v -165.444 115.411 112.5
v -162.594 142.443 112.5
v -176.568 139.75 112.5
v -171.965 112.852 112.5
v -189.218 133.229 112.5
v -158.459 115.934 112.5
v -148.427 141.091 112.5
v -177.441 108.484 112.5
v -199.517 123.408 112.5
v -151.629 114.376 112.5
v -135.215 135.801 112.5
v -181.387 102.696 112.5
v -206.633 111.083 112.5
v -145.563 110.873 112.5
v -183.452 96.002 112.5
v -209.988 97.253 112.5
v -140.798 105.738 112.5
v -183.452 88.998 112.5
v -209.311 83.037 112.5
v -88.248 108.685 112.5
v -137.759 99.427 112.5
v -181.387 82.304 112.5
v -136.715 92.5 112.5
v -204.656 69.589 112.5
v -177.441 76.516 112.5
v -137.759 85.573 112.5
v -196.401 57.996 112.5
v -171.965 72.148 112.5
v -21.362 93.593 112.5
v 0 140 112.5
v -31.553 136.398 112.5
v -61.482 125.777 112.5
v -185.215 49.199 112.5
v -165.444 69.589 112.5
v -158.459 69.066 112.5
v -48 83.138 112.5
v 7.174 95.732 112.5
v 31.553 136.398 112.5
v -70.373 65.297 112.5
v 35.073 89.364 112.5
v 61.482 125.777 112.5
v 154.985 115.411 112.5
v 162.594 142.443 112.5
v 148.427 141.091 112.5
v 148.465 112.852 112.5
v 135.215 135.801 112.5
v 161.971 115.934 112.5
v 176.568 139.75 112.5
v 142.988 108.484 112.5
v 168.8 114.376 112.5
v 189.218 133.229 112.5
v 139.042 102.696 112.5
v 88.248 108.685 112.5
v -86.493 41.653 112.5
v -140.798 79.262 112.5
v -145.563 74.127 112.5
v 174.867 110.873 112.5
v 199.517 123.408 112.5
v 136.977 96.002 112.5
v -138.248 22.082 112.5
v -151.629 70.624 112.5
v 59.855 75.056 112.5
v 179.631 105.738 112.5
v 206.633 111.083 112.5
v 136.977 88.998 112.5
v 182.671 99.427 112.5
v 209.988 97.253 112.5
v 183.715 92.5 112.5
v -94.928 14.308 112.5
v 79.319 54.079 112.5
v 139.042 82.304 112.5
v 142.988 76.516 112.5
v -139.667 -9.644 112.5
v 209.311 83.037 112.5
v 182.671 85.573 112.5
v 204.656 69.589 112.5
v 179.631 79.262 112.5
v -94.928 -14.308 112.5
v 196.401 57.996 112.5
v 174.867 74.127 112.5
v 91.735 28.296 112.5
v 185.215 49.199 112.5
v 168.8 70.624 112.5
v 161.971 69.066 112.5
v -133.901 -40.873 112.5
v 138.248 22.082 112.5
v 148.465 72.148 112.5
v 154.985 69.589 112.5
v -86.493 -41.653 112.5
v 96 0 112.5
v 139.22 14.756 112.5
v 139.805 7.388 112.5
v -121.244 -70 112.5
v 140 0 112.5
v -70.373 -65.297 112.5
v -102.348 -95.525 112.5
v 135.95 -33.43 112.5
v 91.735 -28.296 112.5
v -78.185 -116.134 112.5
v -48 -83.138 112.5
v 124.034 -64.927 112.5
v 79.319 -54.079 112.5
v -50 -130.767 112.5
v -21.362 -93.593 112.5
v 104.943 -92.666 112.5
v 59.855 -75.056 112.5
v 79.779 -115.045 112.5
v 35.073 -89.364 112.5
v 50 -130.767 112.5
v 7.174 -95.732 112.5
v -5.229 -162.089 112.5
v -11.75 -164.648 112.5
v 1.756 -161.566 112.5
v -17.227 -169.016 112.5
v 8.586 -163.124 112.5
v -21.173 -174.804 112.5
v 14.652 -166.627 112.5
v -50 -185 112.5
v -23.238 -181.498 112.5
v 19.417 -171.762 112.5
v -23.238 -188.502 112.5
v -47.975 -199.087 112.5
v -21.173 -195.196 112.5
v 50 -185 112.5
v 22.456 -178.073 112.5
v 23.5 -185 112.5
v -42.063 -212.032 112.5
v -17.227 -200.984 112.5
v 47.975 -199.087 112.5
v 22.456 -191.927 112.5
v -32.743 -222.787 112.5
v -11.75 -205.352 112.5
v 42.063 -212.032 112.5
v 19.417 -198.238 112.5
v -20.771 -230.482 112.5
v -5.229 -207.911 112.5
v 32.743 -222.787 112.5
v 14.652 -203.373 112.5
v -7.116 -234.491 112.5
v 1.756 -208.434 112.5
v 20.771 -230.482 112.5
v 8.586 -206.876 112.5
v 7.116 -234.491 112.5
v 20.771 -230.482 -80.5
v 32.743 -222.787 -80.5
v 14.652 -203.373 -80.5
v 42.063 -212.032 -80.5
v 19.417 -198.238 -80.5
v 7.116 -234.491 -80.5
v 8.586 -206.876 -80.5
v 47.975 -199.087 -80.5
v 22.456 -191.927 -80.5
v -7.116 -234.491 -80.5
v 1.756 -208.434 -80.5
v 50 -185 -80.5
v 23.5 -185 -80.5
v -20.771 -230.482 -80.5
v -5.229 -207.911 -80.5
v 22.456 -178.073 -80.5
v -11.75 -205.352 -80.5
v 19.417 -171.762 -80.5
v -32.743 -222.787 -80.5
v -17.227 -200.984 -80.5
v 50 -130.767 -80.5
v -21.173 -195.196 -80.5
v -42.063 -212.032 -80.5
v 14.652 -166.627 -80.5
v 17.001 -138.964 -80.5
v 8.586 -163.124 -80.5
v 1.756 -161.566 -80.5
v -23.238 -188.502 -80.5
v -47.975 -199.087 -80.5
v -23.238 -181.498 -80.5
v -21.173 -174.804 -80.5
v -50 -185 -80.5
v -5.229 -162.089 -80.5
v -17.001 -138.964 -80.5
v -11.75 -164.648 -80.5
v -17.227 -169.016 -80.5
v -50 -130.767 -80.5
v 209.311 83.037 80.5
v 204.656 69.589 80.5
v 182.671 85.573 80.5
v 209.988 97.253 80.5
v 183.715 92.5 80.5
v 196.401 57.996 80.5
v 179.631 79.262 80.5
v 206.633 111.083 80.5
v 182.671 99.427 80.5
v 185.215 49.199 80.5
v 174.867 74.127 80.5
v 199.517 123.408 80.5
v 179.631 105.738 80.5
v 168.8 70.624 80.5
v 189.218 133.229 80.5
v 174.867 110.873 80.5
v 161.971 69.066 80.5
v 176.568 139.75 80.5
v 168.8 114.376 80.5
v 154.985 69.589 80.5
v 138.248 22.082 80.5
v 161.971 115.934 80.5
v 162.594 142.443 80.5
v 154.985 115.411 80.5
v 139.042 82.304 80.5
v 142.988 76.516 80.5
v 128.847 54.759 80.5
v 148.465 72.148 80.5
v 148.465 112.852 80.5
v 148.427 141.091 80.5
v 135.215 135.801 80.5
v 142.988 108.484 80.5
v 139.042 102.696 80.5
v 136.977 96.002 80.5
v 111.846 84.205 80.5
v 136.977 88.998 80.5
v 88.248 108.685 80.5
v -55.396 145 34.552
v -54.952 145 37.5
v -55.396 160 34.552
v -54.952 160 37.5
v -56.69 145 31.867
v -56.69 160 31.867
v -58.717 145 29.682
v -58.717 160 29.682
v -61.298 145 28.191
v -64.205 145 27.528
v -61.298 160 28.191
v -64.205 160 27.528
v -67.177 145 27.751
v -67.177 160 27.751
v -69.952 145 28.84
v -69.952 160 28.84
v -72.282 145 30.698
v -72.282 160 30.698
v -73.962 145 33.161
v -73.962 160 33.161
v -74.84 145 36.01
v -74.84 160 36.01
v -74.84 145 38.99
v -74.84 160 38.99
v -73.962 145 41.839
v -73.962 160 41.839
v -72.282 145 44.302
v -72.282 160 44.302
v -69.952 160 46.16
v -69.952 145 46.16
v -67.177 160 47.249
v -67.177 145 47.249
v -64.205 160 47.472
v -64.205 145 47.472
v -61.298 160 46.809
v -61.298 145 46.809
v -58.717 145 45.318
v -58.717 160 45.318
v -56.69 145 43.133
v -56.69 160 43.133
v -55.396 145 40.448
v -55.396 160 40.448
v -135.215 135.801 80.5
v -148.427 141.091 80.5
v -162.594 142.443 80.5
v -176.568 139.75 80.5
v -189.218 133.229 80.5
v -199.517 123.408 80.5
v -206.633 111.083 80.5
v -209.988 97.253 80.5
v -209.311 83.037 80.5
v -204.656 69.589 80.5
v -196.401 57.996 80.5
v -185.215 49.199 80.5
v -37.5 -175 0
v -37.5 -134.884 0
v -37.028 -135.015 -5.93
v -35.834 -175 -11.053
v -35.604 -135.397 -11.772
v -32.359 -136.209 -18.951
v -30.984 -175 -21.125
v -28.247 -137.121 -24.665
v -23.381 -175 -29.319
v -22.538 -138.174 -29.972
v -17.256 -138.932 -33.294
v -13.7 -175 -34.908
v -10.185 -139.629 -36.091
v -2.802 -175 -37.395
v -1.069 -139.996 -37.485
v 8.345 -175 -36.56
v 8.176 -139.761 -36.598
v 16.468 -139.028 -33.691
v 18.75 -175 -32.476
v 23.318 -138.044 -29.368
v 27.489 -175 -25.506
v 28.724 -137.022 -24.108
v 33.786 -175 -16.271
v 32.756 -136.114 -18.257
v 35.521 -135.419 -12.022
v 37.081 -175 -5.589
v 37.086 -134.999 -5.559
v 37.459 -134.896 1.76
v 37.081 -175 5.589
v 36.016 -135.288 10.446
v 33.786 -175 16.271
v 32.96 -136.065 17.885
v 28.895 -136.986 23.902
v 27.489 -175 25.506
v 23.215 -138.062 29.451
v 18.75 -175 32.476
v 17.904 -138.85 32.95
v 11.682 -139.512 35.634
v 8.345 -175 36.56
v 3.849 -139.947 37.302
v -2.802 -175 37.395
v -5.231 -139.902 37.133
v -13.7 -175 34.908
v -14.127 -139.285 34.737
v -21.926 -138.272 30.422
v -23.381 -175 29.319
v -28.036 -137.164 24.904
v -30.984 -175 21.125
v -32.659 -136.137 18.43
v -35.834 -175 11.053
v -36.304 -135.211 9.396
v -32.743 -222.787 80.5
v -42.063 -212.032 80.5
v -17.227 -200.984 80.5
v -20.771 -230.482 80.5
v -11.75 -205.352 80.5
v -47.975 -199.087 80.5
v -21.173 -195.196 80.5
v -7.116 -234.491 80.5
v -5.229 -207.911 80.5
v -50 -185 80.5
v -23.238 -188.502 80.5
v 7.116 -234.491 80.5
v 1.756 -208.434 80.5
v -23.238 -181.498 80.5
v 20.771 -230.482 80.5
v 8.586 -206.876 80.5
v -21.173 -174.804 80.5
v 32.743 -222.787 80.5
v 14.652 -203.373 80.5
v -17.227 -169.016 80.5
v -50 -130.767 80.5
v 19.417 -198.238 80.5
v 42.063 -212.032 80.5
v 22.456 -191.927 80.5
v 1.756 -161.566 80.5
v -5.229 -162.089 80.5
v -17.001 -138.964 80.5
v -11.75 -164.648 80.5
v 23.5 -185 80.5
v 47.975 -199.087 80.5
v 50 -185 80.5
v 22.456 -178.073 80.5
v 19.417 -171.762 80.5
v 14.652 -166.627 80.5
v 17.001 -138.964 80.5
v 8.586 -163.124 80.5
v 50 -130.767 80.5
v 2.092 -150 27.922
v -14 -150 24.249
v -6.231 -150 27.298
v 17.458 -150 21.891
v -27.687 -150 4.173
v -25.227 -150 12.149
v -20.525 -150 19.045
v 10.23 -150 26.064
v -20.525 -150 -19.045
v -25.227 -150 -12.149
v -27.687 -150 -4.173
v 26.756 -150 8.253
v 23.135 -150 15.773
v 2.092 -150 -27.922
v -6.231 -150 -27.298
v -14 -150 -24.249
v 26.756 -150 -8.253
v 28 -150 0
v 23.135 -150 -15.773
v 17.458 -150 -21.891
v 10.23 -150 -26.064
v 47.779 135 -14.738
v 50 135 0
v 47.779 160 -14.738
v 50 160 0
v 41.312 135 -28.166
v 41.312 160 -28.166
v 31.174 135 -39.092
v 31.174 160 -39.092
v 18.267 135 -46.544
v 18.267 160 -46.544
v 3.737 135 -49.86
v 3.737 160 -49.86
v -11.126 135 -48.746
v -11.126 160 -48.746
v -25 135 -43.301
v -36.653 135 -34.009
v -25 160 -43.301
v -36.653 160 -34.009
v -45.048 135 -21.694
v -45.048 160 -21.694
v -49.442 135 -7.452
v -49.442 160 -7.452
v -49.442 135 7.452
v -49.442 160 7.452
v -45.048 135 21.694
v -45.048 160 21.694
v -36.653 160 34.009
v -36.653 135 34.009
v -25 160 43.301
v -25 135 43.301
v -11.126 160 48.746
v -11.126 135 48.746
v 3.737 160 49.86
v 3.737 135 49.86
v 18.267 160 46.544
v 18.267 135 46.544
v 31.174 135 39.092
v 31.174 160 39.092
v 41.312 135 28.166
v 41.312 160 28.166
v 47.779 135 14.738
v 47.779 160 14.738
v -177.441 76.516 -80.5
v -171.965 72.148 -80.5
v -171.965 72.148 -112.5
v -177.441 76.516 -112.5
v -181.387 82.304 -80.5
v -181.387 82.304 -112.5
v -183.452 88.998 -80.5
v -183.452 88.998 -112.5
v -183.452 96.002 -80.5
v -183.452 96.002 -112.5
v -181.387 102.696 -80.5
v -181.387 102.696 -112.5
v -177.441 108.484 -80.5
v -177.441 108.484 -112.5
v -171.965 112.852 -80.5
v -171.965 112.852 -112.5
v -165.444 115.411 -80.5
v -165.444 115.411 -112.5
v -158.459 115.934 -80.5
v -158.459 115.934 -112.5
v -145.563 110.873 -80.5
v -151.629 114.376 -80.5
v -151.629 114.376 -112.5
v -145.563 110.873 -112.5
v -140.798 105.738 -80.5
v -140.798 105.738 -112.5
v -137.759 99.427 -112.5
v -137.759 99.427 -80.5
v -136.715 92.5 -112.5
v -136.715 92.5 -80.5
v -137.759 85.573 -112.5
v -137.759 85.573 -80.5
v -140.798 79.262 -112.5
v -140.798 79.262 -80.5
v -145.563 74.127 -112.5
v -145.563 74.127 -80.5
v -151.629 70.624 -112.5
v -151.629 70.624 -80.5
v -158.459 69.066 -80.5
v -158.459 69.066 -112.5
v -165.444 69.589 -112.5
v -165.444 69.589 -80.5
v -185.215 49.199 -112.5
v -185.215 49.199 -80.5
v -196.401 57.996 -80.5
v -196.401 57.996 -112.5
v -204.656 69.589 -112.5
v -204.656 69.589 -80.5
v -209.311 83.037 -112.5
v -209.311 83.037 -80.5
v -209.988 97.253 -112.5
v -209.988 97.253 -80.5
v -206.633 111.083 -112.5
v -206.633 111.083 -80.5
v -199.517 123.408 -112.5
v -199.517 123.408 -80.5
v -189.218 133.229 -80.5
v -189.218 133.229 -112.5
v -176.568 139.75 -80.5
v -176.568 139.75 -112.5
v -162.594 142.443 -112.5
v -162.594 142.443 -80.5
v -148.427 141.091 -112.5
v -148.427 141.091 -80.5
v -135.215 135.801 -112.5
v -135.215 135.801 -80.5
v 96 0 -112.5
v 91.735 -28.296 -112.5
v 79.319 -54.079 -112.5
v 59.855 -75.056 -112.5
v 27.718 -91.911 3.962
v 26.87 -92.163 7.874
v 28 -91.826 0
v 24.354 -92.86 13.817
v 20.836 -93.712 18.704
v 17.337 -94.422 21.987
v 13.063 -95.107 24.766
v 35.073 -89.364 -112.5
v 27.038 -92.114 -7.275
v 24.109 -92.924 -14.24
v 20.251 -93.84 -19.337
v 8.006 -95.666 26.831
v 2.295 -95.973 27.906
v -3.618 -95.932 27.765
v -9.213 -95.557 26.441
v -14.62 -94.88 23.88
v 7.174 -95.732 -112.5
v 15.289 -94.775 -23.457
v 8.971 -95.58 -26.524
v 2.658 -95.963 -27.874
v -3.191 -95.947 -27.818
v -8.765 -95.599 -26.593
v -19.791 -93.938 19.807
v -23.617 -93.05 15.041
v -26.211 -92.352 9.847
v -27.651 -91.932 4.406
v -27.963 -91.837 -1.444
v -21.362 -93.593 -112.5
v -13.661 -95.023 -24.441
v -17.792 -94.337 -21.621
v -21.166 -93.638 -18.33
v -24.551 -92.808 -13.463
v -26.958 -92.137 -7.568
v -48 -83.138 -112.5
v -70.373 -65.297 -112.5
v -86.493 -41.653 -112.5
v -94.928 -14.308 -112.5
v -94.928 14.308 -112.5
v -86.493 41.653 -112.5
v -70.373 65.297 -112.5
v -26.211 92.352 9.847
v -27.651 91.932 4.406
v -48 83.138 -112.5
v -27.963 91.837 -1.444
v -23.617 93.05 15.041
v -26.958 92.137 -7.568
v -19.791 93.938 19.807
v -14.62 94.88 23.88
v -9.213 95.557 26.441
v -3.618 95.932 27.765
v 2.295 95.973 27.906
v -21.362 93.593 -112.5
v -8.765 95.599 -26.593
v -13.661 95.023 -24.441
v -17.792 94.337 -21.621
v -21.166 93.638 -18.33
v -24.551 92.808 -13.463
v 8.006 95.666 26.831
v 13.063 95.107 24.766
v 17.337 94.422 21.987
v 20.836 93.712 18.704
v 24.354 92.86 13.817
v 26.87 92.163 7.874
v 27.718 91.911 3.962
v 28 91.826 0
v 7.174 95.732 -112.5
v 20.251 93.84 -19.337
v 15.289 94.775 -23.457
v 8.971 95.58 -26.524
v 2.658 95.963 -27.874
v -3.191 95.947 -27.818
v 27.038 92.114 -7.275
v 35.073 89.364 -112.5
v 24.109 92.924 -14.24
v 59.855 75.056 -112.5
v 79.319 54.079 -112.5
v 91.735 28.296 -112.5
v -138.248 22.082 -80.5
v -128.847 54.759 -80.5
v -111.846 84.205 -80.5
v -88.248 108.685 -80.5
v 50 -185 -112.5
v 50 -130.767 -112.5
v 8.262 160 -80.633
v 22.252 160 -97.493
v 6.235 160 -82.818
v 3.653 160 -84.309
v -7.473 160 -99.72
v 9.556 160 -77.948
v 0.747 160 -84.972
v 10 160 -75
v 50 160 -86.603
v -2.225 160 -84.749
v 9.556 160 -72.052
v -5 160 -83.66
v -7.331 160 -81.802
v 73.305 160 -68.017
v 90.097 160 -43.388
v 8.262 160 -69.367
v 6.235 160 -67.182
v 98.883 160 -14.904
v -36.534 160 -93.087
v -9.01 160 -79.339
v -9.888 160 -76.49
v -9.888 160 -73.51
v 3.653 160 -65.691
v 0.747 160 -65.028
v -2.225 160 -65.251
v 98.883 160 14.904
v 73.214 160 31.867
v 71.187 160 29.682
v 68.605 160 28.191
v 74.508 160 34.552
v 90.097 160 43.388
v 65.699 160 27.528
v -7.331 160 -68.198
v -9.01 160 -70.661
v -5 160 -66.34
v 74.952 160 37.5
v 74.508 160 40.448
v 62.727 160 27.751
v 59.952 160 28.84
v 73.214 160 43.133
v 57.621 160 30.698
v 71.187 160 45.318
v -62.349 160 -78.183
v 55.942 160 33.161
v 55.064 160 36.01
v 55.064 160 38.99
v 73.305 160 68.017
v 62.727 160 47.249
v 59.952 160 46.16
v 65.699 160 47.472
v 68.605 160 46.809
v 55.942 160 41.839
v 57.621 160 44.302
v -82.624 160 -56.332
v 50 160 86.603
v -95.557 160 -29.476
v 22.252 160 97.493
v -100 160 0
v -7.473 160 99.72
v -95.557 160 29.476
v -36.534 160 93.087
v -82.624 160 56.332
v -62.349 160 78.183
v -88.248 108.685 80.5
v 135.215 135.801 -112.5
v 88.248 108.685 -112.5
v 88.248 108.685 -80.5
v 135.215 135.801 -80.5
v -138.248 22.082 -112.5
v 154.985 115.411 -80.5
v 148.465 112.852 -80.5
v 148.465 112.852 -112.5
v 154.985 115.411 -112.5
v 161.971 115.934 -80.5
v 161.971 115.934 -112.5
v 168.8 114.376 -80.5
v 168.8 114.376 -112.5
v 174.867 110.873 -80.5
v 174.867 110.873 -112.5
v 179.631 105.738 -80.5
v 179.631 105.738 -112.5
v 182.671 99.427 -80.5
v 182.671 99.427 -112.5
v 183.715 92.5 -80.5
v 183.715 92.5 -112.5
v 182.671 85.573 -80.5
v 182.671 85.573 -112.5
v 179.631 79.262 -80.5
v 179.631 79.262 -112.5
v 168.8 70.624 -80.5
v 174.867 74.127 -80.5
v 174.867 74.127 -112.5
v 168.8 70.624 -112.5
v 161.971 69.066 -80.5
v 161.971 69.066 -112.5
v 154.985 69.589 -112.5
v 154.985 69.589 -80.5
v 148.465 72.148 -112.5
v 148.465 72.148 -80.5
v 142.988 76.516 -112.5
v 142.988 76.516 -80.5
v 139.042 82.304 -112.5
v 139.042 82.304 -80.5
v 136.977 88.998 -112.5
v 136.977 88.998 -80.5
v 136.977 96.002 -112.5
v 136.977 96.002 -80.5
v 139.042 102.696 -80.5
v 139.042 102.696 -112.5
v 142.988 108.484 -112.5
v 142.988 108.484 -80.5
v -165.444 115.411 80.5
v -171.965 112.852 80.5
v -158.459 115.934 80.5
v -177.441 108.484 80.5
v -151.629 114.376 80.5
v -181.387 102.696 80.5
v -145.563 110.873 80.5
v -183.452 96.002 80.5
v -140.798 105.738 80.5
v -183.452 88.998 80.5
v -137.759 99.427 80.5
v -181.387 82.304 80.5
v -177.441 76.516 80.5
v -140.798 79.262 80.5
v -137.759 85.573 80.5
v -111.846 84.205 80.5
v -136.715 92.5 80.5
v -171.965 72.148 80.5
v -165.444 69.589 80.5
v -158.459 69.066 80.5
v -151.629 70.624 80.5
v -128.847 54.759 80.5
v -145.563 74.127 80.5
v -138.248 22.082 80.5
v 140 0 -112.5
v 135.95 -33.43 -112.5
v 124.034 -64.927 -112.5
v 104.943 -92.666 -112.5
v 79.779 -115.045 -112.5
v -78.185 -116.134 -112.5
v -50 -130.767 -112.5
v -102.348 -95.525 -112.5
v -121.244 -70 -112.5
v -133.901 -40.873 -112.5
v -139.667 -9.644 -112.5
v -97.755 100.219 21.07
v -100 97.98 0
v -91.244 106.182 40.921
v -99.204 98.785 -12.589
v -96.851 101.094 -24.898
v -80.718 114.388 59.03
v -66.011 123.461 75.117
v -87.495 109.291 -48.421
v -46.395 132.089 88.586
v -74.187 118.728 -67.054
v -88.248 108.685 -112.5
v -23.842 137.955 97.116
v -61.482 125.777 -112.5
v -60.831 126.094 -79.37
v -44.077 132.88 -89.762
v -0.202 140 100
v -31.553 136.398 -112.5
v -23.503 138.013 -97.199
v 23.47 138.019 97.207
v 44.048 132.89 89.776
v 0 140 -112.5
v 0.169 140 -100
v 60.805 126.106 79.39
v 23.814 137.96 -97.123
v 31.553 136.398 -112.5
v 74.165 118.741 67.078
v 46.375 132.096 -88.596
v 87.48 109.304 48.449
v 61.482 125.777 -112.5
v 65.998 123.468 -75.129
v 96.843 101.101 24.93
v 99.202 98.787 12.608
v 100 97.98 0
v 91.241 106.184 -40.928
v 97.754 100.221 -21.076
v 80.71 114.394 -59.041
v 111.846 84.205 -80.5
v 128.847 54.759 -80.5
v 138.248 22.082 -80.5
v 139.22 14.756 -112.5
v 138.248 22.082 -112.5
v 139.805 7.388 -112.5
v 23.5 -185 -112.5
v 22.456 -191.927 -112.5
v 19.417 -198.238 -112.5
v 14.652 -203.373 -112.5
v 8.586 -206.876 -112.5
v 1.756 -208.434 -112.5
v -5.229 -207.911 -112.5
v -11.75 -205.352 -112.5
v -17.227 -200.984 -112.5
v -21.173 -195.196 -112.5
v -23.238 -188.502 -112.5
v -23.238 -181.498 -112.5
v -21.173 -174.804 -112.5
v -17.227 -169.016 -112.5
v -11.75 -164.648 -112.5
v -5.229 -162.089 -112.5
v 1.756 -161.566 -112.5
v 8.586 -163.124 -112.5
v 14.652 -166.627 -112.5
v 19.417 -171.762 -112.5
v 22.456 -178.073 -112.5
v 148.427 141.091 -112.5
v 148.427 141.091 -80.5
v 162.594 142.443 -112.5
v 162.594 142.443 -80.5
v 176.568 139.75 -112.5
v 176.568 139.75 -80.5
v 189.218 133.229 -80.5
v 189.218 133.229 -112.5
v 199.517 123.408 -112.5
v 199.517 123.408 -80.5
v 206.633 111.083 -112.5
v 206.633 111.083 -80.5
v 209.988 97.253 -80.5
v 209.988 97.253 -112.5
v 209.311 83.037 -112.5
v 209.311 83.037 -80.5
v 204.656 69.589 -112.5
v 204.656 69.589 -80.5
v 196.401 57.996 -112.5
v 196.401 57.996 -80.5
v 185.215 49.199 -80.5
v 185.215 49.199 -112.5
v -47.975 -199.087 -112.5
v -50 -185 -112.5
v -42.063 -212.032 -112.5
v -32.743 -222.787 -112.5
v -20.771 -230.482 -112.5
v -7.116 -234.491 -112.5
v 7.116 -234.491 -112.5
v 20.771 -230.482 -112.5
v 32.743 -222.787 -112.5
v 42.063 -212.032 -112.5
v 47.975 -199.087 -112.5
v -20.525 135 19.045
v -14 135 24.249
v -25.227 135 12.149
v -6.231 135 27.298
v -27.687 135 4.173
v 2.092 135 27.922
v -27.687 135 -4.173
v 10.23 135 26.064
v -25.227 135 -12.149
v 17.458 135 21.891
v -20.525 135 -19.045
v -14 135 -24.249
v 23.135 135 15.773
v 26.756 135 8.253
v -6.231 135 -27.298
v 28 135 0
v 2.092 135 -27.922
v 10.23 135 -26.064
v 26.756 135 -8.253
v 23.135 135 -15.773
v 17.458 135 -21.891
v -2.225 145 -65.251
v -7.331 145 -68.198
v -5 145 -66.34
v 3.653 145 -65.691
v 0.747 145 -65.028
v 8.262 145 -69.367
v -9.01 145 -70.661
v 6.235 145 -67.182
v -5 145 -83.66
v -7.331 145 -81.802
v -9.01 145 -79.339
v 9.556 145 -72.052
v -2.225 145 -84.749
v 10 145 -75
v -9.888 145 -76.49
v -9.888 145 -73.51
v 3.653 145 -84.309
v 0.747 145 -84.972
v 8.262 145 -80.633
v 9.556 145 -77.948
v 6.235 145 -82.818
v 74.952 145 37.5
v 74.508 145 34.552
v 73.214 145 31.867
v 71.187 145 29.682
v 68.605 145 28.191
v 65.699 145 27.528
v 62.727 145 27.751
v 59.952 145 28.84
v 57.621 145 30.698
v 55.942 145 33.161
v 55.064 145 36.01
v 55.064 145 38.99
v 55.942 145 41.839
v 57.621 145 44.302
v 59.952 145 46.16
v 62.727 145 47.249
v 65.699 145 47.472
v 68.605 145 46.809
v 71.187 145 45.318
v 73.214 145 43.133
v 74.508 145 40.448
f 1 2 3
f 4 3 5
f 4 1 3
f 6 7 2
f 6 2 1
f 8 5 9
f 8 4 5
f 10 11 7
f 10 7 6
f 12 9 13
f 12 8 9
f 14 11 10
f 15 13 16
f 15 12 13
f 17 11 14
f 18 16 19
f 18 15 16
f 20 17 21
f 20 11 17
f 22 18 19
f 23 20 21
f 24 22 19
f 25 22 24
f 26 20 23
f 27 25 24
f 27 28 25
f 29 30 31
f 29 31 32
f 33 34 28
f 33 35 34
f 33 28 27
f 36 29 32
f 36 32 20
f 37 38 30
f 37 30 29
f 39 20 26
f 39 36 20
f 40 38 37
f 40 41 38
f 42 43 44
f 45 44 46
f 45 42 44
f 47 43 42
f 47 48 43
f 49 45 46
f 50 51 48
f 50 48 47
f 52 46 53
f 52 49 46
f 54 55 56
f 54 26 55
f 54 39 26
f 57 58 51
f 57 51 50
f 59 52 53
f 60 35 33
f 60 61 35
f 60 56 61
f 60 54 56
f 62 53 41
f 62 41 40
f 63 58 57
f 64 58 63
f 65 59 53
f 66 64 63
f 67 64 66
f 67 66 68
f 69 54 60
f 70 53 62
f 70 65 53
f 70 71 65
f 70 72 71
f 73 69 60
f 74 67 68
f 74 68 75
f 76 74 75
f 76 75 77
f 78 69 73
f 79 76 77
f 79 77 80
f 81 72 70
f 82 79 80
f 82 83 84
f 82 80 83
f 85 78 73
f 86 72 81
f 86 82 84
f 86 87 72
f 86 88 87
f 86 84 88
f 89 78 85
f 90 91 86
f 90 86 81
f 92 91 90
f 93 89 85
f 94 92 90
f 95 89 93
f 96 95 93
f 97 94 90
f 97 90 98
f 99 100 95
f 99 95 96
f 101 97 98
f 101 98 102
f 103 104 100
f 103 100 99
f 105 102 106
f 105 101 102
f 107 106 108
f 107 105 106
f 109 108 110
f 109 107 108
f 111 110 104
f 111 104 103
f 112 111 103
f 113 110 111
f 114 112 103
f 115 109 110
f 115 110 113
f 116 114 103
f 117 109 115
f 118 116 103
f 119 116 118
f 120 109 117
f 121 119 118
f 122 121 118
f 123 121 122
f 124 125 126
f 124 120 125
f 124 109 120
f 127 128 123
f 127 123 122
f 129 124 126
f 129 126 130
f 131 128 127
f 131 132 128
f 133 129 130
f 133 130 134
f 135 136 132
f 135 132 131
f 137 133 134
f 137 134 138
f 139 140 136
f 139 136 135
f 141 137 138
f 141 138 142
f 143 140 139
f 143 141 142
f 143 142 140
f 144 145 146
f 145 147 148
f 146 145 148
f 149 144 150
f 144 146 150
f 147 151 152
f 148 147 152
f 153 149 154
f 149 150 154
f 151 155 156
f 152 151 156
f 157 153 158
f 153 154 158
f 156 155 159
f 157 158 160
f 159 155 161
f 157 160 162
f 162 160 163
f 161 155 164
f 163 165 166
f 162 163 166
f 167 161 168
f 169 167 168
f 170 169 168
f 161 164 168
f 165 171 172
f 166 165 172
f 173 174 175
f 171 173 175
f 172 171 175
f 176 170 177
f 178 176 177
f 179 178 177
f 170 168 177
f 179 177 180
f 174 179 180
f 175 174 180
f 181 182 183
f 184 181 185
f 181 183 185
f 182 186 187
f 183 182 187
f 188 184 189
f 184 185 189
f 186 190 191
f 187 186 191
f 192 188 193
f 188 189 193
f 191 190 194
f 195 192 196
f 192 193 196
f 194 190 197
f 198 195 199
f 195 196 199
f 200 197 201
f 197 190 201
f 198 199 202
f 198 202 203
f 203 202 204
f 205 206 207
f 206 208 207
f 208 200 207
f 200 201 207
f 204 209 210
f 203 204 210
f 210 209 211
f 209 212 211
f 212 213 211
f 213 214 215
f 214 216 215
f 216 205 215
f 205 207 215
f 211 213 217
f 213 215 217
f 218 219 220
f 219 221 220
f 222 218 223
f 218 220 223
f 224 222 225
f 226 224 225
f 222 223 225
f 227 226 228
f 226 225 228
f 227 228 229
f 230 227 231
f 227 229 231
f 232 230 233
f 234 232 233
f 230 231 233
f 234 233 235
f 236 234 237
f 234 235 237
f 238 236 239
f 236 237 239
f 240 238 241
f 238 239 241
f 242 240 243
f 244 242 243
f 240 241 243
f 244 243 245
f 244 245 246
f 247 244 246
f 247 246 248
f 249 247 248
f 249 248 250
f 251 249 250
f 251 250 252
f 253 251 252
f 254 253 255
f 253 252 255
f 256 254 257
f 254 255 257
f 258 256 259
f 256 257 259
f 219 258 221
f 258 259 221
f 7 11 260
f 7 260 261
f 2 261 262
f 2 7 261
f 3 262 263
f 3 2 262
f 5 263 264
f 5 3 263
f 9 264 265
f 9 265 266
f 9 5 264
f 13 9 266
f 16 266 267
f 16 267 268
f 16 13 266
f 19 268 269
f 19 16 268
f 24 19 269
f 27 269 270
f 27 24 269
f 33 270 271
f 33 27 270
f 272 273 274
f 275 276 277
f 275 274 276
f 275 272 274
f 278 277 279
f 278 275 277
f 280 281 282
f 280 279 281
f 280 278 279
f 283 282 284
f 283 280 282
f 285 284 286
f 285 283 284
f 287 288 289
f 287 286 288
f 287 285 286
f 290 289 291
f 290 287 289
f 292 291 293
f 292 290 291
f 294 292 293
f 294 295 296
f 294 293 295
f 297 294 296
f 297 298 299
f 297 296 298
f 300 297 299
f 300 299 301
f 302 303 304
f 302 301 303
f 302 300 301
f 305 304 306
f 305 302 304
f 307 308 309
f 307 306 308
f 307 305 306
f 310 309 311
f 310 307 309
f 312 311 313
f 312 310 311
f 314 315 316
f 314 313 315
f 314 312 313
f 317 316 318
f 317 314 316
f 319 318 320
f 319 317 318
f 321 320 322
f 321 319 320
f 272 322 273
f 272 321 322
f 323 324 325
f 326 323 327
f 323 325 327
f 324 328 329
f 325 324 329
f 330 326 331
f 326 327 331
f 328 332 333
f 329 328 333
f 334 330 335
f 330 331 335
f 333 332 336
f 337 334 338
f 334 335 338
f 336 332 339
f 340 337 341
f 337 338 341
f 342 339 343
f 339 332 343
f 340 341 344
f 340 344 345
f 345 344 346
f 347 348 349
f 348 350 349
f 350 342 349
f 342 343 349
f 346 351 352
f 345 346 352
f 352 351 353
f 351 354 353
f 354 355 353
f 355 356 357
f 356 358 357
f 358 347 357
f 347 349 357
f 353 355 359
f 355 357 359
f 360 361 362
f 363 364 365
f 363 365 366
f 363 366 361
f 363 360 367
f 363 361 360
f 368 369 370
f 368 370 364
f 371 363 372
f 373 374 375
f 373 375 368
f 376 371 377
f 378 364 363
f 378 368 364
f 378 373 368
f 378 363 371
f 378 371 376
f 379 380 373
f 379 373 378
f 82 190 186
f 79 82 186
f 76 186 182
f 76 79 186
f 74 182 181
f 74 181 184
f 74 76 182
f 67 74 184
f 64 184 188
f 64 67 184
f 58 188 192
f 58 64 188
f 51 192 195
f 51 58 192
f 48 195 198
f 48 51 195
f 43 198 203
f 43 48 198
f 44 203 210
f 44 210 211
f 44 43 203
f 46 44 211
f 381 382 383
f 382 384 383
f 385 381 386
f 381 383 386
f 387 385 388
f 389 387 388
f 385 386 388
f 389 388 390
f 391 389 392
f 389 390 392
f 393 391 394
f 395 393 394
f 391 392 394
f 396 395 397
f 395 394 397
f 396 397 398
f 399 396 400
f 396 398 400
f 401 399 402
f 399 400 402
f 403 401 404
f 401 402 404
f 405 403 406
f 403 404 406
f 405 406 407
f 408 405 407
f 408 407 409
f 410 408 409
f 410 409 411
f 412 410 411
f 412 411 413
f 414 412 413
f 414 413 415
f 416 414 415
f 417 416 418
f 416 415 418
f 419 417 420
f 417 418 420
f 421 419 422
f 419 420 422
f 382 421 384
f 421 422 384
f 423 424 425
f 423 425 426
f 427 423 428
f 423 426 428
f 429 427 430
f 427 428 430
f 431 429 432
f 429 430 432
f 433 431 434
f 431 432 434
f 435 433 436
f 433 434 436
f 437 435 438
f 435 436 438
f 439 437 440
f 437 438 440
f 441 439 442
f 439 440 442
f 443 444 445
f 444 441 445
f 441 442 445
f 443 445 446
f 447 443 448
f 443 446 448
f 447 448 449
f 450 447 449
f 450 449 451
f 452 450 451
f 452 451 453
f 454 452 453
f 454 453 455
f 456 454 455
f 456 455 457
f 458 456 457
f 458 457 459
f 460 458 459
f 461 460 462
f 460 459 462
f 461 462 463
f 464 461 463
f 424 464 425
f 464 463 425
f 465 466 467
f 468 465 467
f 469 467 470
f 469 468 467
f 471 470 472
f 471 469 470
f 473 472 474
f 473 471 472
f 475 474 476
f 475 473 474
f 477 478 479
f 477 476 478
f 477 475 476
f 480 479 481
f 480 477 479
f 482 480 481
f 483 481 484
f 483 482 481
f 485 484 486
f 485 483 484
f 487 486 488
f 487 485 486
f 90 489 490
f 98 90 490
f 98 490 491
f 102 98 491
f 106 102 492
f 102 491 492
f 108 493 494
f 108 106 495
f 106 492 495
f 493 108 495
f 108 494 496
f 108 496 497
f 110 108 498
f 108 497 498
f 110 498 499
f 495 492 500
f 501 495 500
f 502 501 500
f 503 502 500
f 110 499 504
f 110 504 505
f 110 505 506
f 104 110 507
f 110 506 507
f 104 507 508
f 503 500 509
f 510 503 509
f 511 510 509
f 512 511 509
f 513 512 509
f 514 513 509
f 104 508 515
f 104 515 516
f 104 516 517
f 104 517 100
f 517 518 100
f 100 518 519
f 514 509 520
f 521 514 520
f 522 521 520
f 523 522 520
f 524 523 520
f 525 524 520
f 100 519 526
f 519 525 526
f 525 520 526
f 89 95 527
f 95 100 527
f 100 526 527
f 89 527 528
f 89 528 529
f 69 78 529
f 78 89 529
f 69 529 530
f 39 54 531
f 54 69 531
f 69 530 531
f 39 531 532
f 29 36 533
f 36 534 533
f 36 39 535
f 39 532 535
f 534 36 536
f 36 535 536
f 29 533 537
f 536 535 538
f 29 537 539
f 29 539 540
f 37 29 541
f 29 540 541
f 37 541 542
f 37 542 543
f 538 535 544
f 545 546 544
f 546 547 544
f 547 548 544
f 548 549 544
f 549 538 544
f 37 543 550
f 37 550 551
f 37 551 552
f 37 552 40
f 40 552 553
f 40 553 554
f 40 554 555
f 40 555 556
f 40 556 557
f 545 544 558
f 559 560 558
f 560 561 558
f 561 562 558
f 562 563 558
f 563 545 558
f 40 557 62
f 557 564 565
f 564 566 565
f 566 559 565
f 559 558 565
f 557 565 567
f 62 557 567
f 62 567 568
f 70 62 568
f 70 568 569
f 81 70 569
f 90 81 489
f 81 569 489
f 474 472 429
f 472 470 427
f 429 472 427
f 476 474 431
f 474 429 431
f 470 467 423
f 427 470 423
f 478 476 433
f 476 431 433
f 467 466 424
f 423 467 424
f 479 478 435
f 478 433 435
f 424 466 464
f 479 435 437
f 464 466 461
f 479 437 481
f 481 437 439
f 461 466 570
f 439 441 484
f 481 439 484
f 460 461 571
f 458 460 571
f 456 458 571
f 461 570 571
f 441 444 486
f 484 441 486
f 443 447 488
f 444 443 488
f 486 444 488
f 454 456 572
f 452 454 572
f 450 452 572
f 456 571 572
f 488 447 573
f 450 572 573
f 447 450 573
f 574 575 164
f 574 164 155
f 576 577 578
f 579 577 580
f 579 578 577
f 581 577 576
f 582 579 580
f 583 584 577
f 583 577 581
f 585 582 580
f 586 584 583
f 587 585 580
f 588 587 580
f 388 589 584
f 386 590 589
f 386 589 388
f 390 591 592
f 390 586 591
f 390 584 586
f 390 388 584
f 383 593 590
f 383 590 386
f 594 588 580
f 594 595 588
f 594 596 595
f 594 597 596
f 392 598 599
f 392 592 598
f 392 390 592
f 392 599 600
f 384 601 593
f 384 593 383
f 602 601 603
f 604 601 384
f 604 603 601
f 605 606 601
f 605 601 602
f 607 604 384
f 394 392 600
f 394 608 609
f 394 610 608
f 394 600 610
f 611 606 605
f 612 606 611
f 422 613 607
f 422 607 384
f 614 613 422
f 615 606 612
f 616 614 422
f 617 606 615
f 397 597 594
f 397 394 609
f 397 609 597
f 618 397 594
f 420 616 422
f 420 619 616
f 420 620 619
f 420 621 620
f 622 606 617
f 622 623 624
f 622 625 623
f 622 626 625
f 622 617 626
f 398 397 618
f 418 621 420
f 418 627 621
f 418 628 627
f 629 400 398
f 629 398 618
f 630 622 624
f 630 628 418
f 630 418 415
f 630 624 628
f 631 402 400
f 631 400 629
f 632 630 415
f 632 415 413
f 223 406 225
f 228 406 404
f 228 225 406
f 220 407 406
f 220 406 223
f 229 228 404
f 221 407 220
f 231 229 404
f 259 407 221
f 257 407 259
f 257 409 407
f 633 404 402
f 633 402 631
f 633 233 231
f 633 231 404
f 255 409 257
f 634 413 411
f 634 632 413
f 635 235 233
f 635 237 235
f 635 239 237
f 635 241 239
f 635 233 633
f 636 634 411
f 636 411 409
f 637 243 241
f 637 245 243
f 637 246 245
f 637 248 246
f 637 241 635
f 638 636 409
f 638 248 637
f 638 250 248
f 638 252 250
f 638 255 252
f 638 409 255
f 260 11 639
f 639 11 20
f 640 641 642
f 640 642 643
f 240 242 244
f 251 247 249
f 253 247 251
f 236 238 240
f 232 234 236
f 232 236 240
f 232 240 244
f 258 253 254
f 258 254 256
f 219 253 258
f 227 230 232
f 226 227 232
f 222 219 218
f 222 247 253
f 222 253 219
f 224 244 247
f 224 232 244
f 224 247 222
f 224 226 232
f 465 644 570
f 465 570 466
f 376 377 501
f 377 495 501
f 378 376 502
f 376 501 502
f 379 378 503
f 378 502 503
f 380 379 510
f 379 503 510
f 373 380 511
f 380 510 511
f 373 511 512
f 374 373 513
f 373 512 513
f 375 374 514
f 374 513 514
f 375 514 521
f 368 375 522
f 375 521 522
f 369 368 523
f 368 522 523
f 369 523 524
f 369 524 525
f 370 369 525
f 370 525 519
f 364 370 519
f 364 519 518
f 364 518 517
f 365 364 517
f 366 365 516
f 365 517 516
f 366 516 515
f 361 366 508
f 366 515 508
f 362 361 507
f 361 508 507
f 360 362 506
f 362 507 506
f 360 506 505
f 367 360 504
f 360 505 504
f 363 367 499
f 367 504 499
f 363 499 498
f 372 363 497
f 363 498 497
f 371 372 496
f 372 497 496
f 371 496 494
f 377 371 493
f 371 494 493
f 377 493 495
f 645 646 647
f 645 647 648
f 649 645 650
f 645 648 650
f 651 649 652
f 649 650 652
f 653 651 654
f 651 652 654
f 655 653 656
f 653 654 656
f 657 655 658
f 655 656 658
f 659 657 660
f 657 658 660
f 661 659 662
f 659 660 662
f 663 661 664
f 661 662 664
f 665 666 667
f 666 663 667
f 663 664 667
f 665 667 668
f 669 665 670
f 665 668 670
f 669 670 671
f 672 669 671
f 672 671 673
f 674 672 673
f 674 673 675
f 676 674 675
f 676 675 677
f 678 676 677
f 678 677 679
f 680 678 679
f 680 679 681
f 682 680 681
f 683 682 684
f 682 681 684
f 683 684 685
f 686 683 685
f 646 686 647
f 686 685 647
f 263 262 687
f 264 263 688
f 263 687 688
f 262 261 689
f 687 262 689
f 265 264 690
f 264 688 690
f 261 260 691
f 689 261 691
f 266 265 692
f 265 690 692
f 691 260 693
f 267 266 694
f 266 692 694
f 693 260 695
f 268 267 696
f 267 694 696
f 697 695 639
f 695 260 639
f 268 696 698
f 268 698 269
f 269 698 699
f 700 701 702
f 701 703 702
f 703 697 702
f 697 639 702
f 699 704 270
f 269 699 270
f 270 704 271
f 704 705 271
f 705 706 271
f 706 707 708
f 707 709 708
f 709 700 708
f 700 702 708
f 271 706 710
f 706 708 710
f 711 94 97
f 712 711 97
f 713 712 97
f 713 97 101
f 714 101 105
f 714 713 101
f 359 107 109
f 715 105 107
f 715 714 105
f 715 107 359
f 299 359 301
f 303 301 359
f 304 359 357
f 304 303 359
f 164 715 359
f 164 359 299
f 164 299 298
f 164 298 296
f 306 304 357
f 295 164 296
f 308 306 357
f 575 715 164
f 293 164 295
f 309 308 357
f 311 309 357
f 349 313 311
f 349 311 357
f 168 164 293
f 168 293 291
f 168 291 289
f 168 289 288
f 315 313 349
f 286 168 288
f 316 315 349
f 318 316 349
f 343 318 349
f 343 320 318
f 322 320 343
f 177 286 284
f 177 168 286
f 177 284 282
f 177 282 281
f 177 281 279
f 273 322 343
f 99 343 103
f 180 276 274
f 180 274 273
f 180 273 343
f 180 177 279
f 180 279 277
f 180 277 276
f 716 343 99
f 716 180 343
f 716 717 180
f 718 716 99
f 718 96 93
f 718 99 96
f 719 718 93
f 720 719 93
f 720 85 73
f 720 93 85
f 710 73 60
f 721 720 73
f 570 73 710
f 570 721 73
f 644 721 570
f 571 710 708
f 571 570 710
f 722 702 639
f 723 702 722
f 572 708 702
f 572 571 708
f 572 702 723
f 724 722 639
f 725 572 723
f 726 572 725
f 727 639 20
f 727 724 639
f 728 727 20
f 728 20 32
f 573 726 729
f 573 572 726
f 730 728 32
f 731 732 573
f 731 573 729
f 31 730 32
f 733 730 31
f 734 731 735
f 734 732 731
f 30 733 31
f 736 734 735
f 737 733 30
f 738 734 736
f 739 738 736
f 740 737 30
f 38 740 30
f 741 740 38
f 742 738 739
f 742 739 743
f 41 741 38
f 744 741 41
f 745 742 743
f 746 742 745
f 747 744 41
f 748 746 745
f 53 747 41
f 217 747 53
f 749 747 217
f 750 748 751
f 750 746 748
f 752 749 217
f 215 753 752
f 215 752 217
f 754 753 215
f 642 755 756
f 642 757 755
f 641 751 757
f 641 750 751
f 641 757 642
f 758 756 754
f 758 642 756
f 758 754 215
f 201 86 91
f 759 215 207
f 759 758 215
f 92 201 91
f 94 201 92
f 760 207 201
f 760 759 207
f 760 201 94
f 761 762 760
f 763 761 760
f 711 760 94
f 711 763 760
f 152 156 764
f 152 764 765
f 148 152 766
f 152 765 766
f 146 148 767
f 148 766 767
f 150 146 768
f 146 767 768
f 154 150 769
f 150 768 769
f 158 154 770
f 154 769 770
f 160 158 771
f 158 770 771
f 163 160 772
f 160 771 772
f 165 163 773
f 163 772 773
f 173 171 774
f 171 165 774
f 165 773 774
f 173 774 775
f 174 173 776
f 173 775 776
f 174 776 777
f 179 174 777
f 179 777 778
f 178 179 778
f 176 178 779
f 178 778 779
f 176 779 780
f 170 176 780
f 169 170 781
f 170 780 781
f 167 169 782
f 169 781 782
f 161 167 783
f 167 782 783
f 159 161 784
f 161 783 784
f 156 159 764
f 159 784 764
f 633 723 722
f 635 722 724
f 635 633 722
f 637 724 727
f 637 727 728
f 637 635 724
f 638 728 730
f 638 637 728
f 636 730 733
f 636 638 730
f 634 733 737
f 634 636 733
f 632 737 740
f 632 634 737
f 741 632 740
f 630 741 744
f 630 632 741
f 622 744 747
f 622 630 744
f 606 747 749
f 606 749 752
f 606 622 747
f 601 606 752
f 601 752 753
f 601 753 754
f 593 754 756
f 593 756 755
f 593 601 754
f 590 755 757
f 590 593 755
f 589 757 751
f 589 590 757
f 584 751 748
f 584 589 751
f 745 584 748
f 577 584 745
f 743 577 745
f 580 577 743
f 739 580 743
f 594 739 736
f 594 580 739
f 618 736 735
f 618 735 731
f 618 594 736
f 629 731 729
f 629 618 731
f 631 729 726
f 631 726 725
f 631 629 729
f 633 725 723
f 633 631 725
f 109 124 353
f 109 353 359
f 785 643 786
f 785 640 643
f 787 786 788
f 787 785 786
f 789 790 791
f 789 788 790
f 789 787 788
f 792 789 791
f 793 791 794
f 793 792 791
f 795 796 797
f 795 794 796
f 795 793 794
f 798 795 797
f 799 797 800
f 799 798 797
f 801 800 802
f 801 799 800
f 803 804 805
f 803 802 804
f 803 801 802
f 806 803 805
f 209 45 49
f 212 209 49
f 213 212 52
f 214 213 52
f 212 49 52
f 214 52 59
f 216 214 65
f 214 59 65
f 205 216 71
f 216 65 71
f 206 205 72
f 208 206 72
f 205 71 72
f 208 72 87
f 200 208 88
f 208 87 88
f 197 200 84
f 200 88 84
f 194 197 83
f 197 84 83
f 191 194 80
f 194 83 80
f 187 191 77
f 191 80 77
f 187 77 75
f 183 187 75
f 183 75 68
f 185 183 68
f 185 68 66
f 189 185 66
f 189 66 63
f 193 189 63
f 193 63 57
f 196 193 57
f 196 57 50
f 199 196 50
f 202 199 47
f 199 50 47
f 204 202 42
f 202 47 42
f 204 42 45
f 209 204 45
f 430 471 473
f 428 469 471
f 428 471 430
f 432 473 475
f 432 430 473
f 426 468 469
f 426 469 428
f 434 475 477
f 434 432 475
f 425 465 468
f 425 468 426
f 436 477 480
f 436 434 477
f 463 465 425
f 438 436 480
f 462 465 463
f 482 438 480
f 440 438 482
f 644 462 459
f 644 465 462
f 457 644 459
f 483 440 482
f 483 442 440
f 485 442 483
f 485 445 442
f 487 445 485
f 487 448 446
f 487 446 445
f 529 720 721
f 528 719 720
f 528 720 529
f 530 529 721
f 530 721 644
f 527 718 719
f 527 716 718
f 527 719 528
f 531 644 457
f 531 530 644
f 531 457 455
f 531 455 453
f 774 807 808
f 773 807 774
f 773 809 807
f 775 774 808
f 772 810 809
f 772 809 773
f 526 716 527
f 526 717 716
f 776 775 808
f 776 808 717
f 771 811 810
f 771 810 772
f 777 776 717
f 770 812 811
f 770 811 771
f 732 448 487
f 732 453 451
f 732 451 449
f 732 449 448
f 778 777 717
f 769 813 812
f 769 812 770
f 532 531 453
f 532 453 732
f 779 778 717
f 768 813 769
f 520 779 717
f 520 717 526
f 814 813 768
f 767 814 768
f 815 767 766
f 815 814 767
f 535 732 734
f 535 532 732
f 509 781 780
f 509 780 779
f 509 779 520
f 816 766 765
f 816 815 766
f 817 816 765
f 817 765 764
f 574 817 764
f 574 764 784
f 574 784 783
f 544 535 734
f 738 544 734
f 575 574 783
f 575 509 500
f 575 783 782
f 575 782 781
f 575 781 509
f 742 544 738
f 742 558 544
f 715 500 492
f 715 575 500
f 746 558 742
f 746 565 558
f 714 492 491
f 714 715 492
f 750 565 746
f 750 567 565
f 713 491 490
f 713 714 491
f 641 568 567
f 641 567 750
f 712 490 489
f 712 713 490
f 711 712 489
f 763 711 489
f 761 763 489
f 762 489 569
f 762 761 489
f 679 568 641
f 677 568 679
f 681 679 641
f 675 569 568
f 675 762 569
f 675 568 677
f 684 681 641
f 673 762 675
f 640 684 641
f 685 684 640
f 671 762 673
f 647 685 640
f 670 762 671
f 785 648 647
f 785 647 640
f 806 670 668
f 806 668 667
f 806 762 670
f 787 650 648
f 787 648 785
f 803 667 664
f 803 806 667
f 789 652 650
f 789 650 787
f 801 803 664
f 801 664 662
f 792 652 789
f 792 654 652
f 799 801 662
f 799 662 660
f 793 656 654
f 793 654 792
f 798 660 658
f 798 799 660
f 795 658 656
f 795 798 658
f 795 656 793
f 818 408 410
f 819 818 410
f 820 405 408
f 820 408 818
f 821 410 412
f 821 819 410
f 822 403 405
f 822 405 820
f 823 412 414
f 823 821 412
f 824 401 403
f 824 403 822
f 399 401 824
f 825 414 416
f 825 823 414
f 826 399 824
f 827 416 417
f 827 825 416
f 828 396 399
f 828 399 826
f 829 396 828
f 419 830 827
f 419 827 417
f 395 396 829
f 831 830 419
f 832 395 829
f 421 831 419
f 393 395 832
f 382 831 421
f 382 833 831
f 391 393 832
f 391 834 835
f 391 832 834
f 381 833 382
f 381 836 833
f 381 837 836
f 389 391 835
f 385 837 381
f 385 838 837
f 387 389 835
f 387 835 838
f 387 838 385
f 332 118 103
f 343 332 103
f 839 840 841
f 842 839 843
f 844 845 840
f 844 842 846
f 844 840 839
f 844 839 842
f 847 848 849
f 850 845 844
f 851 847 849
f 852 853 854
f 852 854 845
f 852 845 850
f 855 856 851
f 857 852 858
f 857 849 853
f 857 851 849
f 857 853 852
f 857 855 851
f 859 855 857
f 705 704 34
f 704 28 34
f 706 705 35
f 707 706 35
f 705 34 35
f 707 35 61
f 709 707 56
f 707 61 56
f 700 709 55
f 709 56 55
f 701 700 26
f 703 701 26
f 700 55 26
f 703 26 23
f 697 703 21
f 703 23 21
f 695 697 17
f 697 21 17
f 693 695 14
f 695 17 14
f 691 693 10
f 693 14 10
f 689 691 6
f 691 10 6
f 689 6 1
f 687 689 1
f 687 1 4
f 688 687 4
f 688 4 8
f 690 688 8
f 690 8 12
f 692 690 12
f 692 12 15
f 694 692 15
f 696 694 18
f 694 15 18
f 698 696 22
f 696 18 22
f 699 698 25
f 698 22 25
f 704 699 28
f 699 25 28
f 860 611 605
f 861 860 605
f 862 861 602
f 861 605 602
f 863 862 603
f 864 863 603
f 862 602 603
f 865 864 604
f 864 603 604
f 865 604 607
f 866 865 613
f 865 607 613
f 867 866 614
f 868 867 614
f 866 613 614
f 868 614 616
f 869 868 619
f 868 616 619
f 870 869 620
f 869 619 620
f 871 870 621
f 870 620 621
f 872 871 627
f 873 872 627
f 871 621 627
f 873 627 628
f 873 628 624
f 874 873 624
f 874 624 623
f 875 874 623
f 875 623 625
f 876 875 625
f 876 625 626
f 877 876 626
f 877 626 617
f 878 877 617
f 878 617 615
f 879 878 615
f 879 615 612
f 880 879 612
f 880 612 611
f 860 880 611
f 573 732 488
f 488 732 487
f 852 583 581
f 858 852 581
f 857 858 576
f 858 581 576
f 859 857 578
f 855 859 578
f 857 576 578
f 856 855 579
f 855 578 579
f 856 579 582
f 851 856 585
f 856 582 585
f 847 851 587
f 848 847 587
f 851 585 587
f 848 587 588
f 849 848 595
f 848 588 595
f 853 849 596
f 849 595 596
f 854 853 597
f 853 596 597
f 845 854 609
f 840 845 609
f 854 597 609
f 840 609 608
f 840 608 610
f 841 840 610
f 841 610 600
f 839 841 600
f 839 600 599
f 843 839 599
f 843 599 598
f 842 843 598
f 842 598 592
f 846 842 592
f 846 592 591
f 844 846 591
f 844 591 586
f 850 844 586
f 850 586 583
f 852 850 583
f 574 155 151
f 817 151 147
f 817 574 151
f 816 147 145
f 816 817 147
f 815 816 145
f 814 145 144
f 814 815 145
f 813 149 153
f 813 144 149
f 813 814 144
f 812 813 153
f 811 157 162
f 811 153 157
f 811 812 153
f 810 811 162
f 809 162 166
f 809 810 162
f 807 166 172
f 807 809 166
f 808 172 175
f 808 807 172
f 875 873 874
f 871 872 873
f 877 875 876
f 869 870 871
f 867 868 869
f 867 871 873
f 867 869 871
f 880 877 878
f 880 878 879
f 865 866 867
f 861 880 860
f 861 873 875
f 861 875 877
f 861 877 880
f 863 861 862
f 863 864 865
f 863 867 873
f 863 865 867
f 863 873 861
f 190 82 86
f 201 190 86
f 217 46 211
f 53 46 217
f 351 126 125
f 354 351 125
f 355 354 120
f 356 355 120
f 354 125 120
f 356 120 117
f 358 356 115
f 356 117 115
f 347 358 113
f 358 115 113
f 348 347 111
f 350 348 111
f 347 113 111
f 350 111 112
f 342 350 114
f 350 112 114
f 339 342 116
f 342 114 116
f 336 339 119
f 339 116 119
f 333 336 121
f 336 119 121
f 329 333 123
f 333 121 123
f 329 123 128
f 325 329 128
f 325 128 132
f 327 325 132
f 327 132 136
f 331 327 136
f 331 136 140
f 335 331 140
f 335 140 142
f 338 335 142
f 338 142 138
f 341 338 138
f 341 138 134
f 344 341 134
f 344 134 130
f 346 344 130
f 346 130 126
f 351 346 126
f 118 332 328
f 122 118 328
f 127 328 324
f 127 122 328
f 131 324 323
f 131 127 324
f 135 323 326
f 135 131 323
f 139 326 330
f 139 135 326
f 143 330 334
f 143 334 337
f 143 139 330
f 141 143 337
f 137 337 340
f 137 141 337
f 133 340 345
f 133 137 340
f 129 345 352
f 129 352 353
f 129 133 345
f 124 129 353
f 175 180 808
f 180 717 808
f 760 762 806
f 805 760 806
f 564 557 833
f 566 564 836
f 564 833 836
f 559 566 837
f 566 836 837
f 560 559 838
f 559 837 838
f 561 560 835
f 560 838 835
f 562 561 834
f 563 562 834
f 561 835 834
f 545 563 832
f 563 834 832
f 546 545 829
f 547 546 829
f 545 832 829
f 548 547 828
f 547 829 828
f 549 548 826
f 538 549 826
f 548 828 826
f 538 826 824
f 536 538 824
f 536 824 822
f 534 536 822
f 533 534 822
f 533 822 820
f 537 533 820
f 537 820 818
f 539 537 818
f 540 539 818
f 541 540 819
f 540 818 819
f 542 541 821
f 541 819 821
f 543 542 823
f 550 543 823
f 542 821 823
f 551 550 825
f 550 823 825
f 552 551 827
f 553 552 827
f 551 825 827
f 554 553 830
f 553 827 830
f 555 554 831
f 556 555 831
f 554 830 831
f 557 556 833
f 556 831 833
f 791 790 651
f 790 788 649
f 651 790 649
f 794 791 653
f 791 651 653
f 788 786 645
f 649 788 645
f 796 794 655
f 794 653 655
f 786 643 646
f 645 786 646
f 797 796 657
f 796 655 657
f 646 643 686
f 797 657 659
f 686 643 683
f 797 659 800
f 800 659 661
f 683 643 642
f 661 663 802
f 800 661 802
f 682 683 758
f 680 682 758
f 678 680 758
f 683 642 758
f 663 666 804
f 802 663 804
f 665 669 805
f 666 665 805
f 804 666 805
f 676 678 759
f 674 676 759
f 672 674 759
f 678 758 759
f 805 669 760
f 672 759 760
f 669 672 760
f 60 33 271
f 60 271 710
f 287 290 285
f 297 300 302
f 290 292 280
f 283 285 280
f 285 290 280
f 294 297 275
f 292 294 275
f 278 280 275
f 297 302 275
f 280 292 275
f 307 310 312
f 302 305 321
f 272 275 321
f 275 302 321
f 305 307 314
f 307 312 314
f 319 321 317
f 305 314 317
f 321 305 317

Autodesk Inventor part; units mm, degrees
ref_plane "YZ Plane" through (0, 0, 0) normal (1, 0, 0) x (0, 1, 0)
sketch "Esboço1" plane through (0, 0, 0) normal (0, 0, 1) x (1, 0, 0)
  circle A0 centre (0, 0) radius 140
  circle A1 centre (0, 0) radius 96
  dimension "d0" = 280
  dimension "d1" = 192
extrude "Extrusão1" add sketch "Esboço1" along normal mid plane 225
ref_plane "Plano de trabalho1" through (0, 160, 0) normal (0, 1, 0) x (-1, 0, 0)
sketch "Esboço2" plane through (0, 160, 0) normal (0, 1, 0) x (-1, 0, 0)
  circle A0 centre (0, 0) radius 100
  dimension "d5" = 200
extrude "Extrusão2" add sketch "Esboço2" against normal up to next
ref_plane "Plano de trabalho2" through (0, -175, 0) normal (0, 1, 0) x (-1, 0, 0)
sketch "Esboço3" plane through (0, -175, 0) normal (0, 1, 0) x (-1, 0, 0)
  circle A0 centre (0, 0) radius 37.5
  dimension "d9" = 75
extrude "Extrusão3" add sketch "Esboço3" along normal up to next
sketch "Esboço4" plane through (0, 160, 0) normal (0, 1, 0) x (1, 0, 0)
  circle A0 centre (0, 0) radius 50
  dimension "d12" = 100
extrude "Extrusão4" cut sketch "Esboço4" against normal blind 25
sketch "Esboço5" plane through (0, 135, 0) normal (0, 1, 0) x (1, 0, 0)
  circle A0 centre (0, 0) radius 28
  dimension "d15" = 56
extrude "Extrusão5" cut sketch "Esboço5" against normal blind 285
sketch "Esboço6" plane through (0, 160, 0) normal (0, 1, 0) x (1, 0, 0)
  circle A0 centre (0, 75) radius 10
  circle A1 centre (-64.9519, -37.5) radius 10
  circle A2 centre (64.9519, -37.5) radius 10
  point P0 (0, 0)
  dimension "d18" = 20
  dimension "d19" = 75
  dimension "d22" = 360
extrude "Extrusão6" cut sketch "Esboço6" against normal blind 15
sketch "Esboço7" plane through (0, 0, 112.5) normal (0, 0, 1) x (1, 0, 0)
  arc A0 (-50, -185) -> (50, -185) centre (0, -185) ccw
  circle A1 centre (0, -185) radius 23.5
  line L0 (50, -185) -> (50, -106.8082)
  line L1 (-50, -185) -> (-50, -106.8082)
  line L2 (50, -106.8082) -> (-50, -106.8082)
  point P0 (0, 0)
  dimension "d26" = 100
  dimension "d27" = 47
  dimension "d28" = 185
extrude "Extrusão7" add sketch "Esboço7" against normal blind 32
pattern_circular "Padrão circular1" count 3 over 360 about axis through (0, 0, 0) along (0, 0, 1) of "Extrusão7"
mirror "Espelhamento1" about plane through (0, 0, 0) normal (0, 0, 1) of "Extrusão7", "Padrão circular1"
properties part number "Corpo da Valvula"
